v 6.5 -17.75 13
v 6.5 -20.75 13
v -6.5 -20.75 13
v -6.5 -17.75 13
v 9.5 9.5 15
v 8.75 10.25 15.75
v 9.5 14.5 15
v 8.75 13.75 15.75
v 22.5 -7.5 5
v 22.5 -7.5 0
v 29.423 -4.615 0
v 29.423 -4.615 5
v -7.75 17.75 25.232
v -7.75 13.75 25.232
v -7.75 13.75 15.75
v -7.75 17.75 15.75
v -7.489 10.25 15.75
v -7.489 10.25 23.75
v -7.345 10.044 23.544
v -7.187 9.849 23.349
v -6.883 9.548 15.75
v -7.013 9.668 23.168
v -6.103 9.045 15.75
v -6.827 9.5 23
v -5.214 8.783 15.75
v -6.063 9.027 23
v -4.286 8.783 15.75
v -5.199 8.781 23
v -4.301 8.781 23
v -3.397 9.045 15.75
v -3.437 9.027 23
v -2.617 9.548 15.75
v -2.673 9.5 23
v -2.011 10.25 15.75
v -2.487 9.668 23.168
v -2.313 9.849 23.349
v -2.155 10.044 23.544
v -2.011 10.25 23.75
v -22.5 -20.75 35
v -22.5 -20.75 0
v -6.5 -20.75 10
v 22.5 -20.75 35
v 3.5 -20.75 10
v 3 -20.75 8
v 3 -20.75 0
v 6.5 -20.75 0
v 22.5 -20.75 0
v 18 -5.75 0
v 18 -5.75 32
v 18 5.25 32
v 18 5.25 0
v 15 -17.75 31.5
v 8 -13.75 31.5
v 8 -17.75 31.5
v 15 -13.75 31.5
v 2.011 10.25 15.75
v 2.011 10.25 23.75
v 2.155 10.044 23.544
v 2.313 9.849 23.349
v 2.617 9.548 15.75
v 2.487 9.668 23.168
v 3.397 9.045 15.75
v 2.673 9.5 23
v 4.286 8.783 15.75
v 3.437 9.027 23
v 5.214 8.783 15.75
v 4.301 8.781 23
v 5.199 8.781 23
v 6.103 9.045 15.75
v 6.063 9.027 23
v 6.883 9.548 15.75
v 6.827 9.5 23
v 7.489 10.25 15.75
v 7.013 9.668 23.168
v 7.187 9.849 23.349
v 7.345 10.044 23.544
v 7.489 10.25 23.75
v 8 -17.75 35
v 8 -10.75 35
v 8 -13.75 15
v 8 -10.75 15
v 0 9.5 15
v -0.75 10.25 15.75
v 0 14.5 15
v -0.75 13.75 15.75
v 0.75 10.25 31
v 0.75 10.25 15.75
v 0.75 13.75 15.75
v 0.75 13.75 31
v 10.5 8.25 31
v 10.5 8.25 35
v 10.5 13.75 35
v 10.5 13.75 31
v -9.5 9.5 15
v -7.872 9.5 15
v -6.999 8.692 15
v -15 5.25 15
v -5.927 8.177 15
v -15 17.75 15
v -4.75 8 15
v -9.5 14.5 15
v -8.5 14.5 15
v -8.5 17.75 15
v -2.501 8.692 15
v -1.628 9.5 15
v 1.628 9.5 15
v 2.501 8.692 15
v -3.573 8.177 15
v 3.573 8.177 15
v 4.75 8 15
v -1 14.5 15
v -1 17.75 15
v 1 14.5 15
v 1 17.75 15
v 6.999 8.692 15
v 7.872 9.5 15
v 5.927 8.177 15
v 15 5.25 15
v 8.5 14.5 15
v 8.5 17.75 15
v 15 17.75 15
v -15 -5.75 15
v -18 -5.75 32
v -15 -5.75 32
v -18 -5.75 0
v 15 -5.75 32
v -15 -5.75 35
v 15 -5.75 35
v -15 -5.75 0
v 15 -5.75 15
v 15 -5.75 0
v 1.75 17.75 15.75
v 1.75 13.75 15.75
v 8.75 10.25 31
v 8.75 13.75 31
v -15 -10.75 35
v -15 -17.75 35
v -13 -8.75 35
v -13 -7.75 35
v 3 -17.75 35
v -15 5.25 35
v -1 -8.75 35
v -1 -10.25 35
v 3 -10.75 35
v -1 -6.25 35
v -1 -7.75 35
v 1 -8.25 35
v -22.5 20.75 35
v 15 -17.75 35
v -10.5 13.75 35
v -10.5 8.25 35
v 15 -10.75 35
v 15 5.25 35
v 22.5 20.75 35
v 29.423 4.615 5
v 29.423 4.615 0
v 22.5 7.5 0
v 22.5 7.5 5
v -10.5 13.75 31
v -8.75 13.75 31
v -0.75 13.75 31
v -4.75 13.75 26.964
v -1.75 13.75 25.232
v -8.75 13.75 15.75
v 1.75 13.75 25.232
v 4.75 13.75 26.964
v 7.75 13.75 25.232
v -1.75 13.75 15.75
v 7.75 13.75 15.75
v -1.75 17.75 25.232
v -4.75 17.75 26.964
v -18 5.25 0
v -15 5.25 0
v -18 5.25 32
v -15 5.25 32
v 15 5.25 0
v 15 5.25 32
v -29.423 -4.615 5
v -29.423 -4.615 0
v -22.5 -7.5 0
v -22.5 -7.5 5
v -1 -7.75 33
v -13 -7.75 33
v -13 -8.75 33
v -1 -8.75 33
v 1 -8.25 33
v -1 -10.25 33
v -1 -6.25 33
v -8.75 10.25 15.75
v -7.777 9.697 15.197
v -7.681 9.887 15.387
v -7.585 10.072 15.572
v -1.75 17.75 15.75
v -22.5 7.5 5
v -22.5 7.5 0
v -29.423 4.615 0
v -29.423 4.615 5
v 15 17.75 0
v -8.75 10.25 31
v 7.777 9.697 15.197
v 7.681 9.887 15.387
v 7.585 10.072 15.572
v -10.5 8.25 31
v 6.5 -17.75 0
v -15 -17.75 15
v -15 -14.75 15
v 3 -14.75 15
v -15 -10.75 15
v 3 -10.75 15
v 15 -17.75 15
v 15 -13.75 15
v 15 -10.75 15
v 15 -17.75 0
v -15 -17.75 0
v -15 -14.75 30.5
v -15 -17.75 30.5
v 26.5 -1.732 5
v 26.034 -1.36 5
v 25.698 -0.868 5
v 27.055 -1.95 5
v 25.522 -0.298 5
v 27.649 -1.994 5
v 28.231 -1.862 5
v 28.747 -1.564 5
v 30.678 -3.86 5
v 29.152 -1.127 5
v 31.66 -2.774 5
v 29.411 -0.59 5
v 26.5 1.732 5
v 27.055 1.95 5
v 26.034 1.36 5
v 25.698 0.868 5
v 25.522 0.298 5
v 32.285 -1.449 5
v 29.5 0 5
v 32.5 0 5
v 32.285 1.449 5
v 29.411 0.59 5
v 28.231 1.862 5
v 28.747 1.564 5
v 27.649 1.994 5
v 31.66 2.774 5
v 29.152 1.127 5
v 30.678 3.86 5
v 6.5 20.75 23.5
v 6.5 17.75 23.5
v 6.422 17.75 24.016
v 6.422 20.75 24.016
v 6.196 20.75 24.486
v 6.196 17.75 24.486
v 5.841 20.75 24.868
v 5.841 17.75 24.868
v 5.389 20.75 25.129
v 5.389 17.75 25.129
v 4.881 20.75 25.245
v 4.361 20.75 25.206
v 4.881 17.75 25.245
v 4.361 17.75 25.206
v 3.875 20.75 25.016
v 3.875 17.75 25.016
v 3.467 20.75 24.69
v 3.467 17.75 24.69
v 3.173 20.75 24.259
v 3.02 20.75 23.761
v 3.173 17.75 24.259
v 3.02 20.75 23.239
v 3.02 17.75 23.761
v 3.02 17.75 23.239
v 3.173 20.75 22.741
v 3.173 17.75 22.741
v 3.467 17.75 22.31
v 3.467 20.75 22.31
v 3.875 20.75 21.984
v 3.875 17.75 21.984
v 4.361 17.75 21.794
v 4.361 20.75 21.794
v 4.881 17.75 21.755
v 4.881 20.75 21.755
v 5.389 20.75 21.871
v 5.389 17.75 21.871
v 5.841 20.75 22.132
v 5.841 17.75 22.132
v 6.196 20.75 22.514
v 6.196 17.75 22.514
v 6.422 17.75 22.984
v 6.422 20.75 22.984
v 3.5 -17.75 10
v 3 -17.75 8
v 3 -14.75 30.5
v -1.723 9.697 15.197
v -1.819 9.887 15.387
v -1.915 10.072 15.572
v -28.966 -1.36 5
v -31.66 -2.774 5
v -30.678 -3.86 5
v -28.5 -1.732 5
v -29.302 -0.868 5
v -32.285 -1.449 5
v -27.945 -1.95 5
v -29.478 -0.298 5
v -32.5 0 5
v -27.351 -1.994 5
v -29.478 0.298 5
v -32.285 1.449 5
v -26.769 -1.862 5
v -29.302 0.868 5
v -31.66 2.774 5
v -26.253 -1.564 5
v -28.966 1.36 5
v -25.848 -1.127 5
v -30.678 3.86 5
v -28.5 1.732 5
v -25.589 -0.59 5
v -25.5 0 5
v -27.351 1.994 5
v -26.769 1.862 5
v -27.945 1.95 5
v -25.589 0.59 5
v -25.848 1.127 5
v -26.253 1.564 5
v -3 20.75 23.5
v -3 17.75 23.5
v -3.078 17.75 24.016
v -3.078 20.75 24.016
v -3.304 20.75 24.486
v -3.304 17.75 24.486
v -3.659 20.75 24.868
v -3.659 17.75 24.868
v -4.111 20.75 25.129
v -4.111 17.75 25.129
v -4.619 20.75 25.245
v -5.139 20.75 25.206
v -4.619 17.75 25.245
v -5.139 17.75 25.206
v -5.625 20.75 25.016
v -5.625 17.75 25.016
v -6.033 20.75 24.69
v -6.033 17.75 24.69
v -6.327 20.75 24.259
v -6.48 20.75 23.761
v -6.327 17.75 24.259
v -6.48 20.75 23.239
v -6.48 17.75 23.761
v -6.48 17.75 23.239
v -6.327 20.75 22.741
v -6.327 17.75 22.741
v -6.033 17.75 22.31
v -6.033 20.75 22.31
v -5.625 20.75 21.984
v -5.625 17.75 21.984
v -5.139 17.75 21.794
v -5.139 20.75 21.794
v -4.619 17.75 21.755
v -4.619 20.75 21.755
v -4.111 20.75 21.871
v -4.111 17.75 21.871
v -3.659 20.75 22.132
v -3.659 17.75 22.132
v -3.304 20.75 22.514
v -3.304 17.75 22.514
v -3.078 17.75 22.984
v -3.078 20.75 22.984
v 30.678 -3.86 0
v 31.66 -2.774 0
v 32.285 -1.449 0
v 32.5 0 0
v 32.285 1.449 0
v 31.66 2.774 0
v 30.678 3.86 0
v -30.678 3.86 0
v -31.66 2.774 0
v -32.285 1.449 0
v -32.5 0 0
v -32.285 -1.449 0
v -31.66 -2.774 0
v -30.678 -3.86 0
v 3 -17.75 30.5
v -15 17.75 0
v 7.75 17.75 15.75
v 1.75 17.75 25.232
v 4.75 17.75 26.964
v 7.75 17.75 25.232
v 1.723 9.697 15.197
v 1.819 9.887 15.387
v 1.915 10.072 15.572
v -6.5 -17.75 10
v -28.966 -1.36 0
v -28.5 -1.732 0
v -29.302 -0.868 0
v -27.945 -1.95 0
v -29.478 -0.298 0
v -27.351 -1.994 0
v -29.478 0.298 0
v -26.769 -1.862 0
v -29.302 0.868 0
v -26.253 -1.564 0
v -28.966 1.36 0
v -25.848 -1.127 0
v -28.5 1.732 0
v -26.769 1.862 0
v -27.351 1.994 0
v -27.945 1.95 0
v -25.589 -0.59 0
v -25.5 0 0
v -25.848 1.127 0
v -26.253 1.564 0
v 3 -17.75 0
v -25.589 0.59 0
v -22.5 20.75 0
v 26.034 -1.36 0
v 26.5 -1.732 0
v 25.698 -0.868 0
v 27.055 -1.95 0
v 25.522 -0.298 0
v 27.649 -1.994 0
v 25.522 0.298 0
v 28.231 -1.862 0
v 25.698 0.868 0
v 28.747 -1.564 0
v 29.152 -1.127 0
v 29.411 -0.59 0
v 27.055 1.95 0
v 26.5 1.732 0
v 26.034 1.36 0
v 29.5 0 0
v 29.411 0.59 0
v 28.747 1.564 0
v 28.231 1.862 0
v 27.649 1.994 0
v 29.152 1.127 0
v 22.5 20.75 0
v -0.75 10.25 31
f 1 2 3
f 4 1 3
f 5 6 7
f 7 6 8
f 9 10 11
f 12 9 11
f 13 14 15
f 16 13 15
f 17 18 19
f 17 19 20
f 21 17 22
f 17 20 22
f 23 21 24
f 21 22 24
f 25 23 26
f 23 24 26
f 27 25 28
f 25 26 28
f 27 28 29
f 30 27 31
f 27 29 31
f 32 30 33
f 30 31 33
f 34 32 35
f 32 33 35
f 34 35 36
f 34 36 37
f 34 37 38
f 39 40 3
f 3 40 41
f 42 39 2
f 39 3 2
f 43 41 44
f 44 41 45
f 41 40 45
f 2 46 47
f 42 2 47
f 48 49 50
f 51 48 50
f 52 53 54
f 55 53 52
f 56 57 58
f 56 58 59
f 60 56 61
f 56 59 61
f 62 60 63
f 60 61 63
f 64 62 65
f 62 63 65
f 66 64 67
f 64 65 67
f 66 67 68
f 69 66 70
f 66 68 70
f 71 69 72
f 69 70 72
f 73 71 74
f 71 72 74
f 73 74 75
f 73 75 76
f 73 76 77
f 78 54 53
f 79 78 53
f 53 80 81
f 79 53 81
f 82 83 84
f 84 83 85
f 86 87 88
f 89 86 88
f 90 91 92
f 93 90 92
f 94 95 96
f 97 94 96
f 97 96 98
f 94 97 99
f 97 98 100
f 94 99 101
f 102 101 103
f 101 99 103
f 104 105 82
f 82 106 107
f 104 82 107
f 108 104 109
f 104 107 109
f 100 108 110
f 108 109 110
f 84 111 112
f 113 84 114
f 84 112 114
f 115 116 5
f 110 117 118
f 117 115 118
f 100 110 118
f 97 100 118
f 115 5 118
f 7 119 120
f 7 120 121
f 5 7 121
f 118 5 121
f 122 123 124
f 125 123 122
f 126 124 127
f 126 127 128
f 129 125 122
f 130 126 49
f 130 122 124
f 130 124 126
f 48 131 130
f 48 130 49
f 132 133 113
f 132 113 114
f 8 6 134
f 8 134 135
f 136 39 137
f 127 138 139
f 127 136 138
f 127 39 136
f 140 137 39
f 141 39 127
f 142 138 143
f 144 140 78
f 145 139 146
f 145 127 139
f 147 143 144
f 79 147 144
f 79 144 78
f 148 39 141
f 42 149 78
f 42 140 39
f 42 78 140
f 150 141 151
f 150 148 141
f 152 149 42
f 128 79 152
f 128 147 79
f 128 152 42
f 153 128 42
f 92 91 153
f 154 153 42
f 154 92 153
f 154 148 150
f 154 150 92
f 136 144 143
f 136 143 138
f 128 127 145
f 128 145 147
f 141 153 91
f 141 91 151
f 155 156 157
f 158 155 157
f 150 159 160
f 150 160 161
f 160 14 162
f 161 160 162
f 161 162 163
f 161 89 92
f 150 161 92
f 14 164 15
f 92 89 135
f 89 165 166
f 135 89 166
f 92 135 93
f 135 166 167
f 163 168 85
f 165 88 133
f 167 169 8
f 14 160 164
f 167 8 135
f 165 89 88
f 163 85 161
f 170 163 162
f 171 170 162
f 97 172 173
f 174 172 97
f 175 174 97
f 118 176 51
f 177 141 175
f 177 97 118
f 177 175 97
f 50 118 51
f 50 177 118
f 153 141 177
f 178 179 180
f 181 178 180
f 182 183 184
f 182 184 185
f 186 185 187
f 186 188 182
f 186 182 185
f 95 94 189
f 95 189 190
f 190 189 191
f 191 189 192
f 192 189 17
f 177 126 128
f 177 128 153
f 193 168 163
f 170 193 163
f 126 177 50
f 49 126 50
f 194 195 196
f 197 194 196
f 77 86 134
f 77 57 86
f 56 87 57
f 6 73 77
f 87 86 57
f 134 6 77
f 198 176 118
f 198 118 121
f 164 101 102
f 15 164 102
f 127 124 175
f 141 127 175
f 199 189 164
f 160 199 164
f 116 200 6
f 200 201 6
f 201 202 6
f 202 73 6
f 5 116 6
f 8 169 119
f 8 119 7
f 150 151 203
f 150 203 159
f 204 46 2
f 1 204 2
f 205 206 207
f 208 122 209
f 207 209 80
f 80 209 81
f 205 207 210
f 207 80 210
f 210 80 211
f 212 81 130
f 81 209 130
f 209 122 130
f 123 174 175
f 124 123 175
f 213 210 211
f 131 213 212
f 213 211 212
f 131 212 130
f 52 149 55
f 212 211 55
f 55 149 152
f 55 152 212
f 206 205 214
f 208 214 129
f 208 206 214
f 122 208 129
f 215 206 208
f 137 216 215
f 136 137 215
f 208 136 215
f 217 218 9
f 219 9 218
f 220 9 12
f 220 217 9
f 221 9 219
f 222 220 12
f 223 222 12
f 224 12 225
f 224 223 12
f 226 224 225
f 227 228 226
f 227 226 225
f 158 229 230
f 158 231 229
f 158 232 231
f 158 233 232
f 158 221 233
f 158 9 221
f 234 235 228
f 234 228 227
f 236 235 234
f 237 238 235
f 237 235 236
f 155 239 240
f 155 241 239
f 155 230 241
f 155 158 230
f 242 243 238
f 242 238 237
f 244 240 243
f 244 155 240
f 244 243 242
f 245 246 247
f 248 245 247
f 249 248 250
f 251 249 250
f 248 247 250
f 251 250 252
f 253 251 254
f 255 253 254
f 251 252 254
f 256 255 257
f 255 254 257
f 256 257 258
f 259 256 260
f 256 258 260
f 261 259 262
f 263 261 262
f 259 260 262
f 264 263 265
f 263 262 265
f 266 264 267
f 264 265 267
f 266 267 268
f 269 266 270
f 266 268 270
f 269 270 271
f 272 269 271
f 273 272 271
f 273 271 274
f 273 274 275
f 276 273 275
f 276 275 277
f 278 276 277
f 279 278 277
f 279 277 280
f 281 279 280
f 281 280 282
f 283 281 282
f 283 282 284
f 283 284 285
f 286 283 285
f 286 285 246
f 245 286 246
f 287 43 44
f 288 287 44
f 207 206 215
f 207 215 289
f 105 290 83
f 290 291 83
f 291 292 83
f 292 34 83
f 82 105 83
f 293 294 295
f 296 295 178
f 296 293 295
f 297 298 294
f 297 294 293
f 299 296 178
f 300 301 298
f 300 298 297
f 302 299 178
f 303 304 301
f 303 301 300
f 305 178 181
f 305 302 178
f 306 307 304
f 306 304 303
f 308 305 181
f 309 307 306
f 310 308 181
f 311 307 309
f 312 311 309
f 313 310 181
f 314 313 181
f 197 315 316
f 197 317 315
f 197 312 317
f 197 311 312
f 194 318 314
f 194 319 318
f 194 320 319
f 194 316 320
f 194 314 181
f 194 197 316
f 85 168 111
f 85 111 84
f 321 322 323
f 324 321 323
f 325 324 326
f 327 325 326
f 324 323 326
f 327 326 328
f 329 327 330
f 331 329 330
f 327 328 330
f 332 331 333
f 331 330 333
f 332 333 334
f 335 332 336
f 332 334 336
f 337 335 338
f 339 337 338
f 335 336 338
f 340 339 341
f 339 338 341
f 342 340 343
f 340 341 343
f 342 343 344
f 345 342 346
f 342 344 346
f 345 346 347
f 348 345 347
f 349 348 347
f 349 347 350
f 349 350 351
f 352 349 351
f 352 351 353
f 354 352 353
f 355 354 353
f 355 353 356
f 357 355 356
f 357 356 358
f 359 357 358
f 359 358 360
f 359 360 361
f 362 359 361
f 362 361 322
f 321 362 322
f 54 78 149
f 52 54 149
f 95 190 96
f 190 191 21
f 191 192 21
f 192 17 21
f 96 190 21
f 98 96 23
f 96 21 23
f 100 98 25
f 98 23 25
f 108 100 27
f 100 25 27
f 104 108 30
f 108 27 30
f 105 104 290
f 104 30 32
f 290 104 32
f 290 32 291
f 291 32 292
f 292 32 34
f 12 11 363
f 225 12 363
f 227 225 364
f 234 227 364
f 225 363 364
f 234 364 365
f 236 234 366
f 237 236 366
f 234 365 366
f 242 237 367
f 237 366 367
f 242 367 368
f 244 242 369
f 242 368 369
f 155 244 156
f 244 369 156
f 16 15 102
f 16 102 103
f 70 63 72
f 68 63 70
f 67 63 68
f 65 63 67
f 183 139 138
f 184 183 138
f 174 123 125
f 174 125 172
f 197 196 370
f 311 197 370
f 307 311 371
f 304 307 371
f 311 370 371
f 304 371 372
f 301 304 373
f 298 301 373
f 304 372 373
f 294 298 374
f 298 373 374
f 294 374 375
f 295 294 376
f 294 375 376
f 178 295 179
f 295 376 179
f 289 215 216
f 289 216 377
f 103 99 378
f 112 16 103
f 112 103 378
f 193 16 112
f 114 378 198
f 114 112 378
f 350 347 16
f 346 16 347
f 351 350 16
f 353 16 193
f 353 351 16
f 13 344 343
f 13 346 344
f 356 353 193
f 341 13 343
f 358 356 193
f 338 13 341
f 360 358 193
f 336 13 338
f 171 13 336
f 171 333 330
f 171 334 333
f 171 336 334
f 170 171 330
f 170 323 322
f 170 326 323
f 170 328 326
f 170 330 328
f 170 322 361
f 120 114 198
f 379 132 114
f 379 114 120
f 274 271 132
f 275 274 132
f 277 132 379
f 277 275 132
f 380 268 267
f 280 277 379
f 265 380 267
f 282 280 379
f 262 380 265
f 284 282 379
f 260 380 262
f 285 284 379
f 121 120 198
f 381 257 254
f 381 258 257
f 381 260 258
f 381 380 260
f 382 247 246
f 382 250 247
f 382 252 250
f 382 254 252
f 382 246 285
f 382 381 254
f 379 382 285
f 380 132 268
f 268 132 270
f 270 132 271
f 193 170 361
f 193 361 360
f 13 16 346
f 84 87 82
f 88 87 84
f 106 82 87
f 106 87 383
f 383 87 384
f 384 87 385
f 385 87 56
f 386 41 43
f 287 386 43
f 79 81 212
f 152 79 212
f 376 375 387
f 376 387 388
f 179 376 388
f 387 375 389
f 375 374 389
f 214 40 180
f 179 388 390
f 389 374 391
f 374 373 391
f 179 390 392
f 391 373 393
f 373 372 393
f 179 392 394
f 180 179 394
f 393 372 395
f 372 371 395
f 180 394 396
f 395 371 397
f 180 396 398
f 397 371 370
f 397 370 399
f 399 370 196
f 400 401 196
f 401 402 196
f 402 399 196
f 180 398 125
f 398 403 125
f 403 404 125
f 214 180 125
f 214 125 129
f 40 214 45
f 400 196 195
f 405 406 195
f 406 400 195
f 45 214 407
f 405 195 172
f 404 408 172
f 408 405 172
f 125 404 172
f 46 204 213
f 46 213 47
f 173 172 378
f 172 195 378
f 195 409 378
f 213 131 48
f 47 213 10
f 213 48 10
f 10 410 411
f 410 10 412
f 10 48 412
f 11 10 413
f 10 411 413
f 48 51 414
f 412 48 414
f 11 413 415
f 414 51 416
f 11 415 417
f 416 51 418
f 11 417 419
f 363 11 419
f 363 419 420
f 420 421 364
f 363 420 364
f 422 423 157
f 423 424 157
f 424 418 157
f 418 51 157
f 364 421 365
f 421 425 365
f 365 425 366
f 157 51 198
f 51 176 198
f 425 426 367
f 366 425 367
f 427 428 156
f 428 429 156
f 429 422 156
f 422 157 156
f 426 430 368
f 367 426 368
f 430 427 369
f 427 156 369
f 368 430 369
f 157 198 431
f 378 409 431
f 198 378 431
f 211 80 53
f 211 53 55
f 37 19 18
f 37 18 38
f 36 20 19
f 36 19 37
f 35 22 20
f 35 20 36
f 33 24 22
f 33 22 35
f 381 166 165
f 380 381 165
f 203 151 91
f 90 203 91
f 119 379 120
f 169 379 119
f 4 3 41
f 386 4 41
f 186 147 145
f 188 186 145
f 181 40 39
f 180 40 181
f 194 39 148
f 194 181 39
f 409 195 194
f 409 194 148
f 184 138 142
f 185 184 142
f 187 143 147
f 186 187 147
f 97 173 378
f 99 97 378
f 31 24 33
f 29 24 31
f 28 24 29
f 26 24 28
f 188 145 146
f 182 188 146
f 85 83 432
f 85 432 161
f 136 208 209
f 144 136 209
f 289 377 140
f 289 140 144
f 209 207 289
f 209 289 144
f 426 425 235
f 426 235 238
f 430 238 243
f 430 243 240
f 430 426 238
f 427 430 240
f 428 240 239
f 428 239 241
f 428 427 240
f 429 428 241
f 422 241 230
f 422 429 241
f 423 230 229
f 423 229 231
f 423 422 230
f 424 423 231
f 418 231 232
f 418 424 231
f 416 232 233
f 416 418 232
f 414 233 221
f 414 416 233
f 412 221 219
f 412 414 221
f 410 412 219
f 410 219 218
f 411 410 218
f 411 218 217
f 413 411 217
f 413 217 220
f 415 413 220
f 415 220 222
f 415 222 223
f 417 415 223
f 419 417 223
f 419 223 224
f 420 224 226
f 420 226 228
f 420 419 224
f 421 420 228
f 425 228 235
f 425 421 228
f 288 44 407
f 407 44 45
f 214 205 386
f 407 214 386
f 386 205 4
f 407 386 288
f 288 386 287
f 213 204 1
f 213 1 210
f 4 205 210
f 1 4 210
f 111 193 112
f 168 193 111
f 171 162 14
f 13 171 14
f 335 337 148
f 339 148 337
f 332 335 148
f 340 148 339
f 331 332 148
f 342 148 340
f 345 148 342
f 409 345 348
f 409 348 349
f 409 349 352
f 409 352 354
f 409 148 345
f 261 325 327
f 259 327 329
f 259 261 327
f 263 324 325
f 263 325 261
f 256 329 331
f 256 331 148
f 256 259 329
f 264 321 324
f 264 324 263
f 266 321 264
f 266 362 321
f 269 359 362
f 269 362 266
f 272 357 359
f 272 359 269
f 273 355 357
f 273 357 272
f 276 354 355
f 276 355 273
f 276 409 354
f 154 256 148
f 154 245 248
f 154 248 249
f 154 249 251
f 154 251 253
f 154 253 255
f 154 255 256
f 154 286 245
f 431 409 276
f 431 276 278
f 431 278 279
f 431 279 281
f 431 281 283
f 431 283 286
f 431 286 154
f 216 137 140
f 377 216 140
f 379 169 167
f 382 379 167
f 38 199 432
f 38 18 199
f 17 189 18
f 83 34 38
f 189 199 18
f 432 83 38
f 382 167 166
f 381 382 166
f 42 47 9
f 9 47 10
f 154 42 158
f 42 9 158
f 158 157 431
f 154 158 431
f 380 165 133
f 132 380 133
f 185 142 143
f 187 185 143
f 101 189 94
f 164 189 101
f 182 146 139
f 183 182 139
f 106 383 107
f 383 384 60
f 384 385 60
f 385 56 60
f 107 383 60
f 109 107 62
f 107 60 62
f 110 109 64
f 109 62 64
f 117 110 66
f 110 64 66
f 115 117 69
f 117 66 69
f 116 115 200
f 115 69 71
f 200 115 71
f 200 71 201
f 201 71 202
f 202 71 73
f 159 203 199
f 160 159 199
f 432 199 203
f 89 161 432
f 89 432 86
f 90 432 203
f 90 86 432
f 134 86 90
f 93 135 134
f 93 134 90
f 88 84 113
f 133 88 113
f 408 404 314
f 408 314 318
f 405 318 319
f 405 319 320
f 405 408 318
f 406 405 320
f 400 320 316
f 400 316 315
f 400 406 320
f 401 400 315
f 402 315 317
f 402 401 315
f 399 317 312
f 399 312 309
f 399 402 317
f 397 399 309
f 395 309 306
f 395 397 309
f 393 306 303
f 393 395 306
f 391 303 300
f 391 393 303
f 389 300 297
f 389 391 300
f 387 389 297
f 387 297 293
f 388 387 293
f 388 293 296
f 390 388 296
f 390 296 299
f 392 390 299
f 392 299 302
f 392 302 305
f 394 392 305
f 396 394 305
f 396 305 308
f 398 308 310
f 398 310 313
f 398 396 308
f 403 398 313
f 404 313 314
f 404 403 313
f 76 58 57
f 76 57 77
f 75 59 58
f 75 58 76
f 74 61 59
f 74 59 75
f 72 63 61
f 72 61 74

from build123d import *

# Parameters (mm, degrees)
F0_W      = 45
F0_H      = 41.5
F0_W_2    = 18
F0_H_2    = 4
F0_W_3    = 7
F0_H_3    = 3
F0_W_4    = 30
F0_H_4    = 11
F0_W_5    = 8
F0_H_5    = 3.5
F1_DEPTH  = 35
F2_W      = 21
F2_H      = 5.5
F3_DEPTH  = 4
F4_R      = 1.75
F5_DEPTH  = 25
F7_DEPTH  = 4
F9_START  = -8
F8_R      = 3.25
F9_DEPTH  = 17
F11_START = -3
F10_W     = 36
F10_H     = 11
F11_DEPTH = 32.001
F12_W     = 18
F12_H     = 7
F13_DEPTH = 4.5
F14_W     = 7
F14_H     = 4
F15_DEPTH = 3.5
F17_START = -20
F16_W     = 30
F16_H     = 12.5
F16_H_2   = 12
F17_DEPTH = 15.001
F19_DEPTH = 2
F20_R     = 2
F21_DEPTH = 5
F23_DEPTH = 10
F24_SIZE  = 0.74999


# Not quite as in the source:
# - a fillet or chamfer is up to 0.001 mm smaller than in the source, because OpenCascade refuses the exact size


with BuildPart() as f1:
    # F0 (on Top) → F1 (new body)
    with BuildSketch(Plane.XY):
        Rectangle(F0_W, F0_H)
        with Locations((-6, -12.75)):
            Rectangle(F0_W_2, F0_H_2, mode=Mode.SUBTRACT)
        with Locations((11.5, -12.25)):
            Rectangle(F0_W_3, F0_H_3, mode=Mode.SUBTRACT)
        with Locations((0, -0.25)):
            Rectangle(F0_W_4, F0_H_4, mode=Mode.SUBTRACT)
        with Locations((-4.75, 12)):
            Rectangle(F0_W_5, F0_H_5, mode=Mode.SUBTRACT)
        with Locations((4.75, 12)):
            Rectangle(F0_W_5, F0_H_5, mode=Mode.SUBTRACT)
    extrude(amount=F1_DEPTH)

    # F2 (on face) → F3 (cut)
    with BuildSketch(Plane.XY.offset(35)):
        with Locations((0, 11)):
            Rectangle(F2_W, F2_H)
    extrude(amount=-F3_DEPTH, mode=Mode.SUBTRACT)

    # F4 (on face) → F5 (cut)
    with BuildSketch(Plane.XZ.offset(-13.75)):
        with Locations((4.75, 23.5)):
            Circle(F4_R)
        with Locations((-4.75, 23.5)):
            Circle(F4_R)
    extrude(amount=-F5_DEPTH, mode=Mode.SUBTRACT)

    # F6 (on face) → F7 (cut)
    with BuildSketch(Plane.XZ.offset(-13.75)):
        Polygon((4.75, 26.9641016151), (1.75, 25.2320508076), (1.75, 21.7679491924), (1.75, -5.2918036282), (7.75, -5.2918036282), (7.75, 21.7679491924), (7.75, 25.2320508076), align=None)
        Polygon((-1.75, 21.7679491924), (-1.75, 25.2320508076), (-4.75, 26.9641016151), (-7.75, 25.2320508076), (-7.75, 21.7679491924), (-7.75, -5.2918036282), (-1.75, -5.2918036282), align=None)
    extrude(amount=-F7_DEPTH, mode=Mode.SUBTRACT)

    # F8 (on face) → F9 (cut)
    with BuildSketch(Plane.XY.offset(31).offset(F9_START)):
        with Locations((4.75, 12)):
            Circle(F8_R)
        with Locations((-4.75, 12)):
            Circle(F8_R)
    extrude(amount=-F9_DEPTH, mode=Mode.SUBTRACT)

    # F10 (on face) → F11 (cut)
    with BuildSketch(Plane.XY.offset(35).offset(F11_START)):
        with Locations((0, -0.25)):
            Rectangle(F10_W, F10_H)
    extrude(amount=-F11_DEPTH, mode=Mode.SUBTRACT)

    # F12 (on face) → F13 (cut)
    with BuildSketch(Plane.XY.offset(35)):
        with Locations((-6, -14.25)):
            Rectangle(F12_W, F12_H)
    extrude(amount=-F13_DEPTH, mode=Mode.SUBTRACT)

    # F14 (on face) → F15 (cut)
    with BuildSketch(Plane.XY.offset(35)):
        with Locations((11.5, -15.75)):
            Rectangle(F14_W, F14_H)
    extrude(amount=-F15_DEPTH, mode=Mode.SUBTRACT)

    # F16 (on face) → F17 (cut)
    with BuildSketch(Plane.XY.offset(35).offset(F17_START)):
        with Locations((0, 11.5)):
            Rectangle(F16_W, F16_H)
        with Locations((0, -11.75)):
            Rectangle(F16_W, F16_H_2)
    extrude(amount=-F17_DEPTH, mode=Mode.SUBTRACT)

    # F18 (on face) → F19 (cut)
    with BuildSketch(Plane.XY.offset(35)):
        Polygon((-1, -7.75), (-13, -7.75), (-13, -8.75), (-1, -8.75), (-1, -10.25), (1, -8.25), (-1, -6.25), align=None)
    extrude(amount=-F19_DEPTH, mode=Mode.SUBTRACT)

    # F20 (on Top) → F21 (join)
    with BuildSketch(Plane.XY):
        with BuildLine():
            Line((22.5, -7.5), (29.4230769231, -4.6153846154))
            ThreePointArc((29.4230769231, -4.6153846154), (32.5, 0), (29.4230769231, 4.6153846154))
            Line((29.4230769231, 4.6153846154), (22.5, 7.5))
            Line((22.5, 7.5), (22.5, -7.5))
        make_face()
        with Locations((27.5, 0)):
            Circle(F20_R, mode=Mode.SUBTRACT)
        with BuildLine():
            Line((-29.4230769231, -4.6153846154), (-22.5, -7.5))
            Line((-22.5, -7.5), (-22.5, 7.5))
            Line((-22.5, 7.5), (-29.4230769231, 4.6153846154))
            ThreePointArc((-29.4230769231, 4.6153846154), (-32.5, 0), (-29.4230769231, -4.6153846154))
        make_face()
        with Locations((-27.5, 0)):
            Circle(F20_R, mode=Mode.SUBTRACT)
    extrude(amount=F21_DEPTH)

    # F22 (on face) → F23 (cut)
    with BuildSketch(Plane.XZ.offset(20.75)):
        Polygon((3, 8), (3, 0), (6.5, 0), (6.5, 13), (-6.5, 13), (-6.5, 10), (3.5, 10), align=None)
    extrude(amount=-F23_DEPTH, mode=Mode.SUBTRACT)

    # F24 (size 0.75 in the source; OpenCascade refuses exactly that, so slightly less here)
    f24_edges = [f1.edges().sort_by_distance(p)[0] for p in [
        (-7.75, 15.75, 15),
        (-4.75, 8.75, 15),
        (8.119306, 10.25, 15),
        (1.380694, 10.25, 15),
        (-1.380694, 10.25, 15),
        (-8.119306, 10.25, 15),
        (-8.75, 12, 15),
        (-8.25, 13.75, 15),
        (-1.25, 13.75, 15),
        (1.25, 13.75, 15),
        (8.25, 13.75, 15),
        (-1.75, 15.75, 15),
        (1.75, 15.75, 15),
        (4.75, 8.75, 15),
        (8.75, 12, 15),
        (7.75, 15.75, 15),
        (-0.75, 12, 15),
        (0.75, 12, 15),
        (4.75, 10.25, 23),
        (-4.75, 10.25, 23),
    ]]
    chamfer(f24_edges, length=F24_SIZE)


solid = f1.part
